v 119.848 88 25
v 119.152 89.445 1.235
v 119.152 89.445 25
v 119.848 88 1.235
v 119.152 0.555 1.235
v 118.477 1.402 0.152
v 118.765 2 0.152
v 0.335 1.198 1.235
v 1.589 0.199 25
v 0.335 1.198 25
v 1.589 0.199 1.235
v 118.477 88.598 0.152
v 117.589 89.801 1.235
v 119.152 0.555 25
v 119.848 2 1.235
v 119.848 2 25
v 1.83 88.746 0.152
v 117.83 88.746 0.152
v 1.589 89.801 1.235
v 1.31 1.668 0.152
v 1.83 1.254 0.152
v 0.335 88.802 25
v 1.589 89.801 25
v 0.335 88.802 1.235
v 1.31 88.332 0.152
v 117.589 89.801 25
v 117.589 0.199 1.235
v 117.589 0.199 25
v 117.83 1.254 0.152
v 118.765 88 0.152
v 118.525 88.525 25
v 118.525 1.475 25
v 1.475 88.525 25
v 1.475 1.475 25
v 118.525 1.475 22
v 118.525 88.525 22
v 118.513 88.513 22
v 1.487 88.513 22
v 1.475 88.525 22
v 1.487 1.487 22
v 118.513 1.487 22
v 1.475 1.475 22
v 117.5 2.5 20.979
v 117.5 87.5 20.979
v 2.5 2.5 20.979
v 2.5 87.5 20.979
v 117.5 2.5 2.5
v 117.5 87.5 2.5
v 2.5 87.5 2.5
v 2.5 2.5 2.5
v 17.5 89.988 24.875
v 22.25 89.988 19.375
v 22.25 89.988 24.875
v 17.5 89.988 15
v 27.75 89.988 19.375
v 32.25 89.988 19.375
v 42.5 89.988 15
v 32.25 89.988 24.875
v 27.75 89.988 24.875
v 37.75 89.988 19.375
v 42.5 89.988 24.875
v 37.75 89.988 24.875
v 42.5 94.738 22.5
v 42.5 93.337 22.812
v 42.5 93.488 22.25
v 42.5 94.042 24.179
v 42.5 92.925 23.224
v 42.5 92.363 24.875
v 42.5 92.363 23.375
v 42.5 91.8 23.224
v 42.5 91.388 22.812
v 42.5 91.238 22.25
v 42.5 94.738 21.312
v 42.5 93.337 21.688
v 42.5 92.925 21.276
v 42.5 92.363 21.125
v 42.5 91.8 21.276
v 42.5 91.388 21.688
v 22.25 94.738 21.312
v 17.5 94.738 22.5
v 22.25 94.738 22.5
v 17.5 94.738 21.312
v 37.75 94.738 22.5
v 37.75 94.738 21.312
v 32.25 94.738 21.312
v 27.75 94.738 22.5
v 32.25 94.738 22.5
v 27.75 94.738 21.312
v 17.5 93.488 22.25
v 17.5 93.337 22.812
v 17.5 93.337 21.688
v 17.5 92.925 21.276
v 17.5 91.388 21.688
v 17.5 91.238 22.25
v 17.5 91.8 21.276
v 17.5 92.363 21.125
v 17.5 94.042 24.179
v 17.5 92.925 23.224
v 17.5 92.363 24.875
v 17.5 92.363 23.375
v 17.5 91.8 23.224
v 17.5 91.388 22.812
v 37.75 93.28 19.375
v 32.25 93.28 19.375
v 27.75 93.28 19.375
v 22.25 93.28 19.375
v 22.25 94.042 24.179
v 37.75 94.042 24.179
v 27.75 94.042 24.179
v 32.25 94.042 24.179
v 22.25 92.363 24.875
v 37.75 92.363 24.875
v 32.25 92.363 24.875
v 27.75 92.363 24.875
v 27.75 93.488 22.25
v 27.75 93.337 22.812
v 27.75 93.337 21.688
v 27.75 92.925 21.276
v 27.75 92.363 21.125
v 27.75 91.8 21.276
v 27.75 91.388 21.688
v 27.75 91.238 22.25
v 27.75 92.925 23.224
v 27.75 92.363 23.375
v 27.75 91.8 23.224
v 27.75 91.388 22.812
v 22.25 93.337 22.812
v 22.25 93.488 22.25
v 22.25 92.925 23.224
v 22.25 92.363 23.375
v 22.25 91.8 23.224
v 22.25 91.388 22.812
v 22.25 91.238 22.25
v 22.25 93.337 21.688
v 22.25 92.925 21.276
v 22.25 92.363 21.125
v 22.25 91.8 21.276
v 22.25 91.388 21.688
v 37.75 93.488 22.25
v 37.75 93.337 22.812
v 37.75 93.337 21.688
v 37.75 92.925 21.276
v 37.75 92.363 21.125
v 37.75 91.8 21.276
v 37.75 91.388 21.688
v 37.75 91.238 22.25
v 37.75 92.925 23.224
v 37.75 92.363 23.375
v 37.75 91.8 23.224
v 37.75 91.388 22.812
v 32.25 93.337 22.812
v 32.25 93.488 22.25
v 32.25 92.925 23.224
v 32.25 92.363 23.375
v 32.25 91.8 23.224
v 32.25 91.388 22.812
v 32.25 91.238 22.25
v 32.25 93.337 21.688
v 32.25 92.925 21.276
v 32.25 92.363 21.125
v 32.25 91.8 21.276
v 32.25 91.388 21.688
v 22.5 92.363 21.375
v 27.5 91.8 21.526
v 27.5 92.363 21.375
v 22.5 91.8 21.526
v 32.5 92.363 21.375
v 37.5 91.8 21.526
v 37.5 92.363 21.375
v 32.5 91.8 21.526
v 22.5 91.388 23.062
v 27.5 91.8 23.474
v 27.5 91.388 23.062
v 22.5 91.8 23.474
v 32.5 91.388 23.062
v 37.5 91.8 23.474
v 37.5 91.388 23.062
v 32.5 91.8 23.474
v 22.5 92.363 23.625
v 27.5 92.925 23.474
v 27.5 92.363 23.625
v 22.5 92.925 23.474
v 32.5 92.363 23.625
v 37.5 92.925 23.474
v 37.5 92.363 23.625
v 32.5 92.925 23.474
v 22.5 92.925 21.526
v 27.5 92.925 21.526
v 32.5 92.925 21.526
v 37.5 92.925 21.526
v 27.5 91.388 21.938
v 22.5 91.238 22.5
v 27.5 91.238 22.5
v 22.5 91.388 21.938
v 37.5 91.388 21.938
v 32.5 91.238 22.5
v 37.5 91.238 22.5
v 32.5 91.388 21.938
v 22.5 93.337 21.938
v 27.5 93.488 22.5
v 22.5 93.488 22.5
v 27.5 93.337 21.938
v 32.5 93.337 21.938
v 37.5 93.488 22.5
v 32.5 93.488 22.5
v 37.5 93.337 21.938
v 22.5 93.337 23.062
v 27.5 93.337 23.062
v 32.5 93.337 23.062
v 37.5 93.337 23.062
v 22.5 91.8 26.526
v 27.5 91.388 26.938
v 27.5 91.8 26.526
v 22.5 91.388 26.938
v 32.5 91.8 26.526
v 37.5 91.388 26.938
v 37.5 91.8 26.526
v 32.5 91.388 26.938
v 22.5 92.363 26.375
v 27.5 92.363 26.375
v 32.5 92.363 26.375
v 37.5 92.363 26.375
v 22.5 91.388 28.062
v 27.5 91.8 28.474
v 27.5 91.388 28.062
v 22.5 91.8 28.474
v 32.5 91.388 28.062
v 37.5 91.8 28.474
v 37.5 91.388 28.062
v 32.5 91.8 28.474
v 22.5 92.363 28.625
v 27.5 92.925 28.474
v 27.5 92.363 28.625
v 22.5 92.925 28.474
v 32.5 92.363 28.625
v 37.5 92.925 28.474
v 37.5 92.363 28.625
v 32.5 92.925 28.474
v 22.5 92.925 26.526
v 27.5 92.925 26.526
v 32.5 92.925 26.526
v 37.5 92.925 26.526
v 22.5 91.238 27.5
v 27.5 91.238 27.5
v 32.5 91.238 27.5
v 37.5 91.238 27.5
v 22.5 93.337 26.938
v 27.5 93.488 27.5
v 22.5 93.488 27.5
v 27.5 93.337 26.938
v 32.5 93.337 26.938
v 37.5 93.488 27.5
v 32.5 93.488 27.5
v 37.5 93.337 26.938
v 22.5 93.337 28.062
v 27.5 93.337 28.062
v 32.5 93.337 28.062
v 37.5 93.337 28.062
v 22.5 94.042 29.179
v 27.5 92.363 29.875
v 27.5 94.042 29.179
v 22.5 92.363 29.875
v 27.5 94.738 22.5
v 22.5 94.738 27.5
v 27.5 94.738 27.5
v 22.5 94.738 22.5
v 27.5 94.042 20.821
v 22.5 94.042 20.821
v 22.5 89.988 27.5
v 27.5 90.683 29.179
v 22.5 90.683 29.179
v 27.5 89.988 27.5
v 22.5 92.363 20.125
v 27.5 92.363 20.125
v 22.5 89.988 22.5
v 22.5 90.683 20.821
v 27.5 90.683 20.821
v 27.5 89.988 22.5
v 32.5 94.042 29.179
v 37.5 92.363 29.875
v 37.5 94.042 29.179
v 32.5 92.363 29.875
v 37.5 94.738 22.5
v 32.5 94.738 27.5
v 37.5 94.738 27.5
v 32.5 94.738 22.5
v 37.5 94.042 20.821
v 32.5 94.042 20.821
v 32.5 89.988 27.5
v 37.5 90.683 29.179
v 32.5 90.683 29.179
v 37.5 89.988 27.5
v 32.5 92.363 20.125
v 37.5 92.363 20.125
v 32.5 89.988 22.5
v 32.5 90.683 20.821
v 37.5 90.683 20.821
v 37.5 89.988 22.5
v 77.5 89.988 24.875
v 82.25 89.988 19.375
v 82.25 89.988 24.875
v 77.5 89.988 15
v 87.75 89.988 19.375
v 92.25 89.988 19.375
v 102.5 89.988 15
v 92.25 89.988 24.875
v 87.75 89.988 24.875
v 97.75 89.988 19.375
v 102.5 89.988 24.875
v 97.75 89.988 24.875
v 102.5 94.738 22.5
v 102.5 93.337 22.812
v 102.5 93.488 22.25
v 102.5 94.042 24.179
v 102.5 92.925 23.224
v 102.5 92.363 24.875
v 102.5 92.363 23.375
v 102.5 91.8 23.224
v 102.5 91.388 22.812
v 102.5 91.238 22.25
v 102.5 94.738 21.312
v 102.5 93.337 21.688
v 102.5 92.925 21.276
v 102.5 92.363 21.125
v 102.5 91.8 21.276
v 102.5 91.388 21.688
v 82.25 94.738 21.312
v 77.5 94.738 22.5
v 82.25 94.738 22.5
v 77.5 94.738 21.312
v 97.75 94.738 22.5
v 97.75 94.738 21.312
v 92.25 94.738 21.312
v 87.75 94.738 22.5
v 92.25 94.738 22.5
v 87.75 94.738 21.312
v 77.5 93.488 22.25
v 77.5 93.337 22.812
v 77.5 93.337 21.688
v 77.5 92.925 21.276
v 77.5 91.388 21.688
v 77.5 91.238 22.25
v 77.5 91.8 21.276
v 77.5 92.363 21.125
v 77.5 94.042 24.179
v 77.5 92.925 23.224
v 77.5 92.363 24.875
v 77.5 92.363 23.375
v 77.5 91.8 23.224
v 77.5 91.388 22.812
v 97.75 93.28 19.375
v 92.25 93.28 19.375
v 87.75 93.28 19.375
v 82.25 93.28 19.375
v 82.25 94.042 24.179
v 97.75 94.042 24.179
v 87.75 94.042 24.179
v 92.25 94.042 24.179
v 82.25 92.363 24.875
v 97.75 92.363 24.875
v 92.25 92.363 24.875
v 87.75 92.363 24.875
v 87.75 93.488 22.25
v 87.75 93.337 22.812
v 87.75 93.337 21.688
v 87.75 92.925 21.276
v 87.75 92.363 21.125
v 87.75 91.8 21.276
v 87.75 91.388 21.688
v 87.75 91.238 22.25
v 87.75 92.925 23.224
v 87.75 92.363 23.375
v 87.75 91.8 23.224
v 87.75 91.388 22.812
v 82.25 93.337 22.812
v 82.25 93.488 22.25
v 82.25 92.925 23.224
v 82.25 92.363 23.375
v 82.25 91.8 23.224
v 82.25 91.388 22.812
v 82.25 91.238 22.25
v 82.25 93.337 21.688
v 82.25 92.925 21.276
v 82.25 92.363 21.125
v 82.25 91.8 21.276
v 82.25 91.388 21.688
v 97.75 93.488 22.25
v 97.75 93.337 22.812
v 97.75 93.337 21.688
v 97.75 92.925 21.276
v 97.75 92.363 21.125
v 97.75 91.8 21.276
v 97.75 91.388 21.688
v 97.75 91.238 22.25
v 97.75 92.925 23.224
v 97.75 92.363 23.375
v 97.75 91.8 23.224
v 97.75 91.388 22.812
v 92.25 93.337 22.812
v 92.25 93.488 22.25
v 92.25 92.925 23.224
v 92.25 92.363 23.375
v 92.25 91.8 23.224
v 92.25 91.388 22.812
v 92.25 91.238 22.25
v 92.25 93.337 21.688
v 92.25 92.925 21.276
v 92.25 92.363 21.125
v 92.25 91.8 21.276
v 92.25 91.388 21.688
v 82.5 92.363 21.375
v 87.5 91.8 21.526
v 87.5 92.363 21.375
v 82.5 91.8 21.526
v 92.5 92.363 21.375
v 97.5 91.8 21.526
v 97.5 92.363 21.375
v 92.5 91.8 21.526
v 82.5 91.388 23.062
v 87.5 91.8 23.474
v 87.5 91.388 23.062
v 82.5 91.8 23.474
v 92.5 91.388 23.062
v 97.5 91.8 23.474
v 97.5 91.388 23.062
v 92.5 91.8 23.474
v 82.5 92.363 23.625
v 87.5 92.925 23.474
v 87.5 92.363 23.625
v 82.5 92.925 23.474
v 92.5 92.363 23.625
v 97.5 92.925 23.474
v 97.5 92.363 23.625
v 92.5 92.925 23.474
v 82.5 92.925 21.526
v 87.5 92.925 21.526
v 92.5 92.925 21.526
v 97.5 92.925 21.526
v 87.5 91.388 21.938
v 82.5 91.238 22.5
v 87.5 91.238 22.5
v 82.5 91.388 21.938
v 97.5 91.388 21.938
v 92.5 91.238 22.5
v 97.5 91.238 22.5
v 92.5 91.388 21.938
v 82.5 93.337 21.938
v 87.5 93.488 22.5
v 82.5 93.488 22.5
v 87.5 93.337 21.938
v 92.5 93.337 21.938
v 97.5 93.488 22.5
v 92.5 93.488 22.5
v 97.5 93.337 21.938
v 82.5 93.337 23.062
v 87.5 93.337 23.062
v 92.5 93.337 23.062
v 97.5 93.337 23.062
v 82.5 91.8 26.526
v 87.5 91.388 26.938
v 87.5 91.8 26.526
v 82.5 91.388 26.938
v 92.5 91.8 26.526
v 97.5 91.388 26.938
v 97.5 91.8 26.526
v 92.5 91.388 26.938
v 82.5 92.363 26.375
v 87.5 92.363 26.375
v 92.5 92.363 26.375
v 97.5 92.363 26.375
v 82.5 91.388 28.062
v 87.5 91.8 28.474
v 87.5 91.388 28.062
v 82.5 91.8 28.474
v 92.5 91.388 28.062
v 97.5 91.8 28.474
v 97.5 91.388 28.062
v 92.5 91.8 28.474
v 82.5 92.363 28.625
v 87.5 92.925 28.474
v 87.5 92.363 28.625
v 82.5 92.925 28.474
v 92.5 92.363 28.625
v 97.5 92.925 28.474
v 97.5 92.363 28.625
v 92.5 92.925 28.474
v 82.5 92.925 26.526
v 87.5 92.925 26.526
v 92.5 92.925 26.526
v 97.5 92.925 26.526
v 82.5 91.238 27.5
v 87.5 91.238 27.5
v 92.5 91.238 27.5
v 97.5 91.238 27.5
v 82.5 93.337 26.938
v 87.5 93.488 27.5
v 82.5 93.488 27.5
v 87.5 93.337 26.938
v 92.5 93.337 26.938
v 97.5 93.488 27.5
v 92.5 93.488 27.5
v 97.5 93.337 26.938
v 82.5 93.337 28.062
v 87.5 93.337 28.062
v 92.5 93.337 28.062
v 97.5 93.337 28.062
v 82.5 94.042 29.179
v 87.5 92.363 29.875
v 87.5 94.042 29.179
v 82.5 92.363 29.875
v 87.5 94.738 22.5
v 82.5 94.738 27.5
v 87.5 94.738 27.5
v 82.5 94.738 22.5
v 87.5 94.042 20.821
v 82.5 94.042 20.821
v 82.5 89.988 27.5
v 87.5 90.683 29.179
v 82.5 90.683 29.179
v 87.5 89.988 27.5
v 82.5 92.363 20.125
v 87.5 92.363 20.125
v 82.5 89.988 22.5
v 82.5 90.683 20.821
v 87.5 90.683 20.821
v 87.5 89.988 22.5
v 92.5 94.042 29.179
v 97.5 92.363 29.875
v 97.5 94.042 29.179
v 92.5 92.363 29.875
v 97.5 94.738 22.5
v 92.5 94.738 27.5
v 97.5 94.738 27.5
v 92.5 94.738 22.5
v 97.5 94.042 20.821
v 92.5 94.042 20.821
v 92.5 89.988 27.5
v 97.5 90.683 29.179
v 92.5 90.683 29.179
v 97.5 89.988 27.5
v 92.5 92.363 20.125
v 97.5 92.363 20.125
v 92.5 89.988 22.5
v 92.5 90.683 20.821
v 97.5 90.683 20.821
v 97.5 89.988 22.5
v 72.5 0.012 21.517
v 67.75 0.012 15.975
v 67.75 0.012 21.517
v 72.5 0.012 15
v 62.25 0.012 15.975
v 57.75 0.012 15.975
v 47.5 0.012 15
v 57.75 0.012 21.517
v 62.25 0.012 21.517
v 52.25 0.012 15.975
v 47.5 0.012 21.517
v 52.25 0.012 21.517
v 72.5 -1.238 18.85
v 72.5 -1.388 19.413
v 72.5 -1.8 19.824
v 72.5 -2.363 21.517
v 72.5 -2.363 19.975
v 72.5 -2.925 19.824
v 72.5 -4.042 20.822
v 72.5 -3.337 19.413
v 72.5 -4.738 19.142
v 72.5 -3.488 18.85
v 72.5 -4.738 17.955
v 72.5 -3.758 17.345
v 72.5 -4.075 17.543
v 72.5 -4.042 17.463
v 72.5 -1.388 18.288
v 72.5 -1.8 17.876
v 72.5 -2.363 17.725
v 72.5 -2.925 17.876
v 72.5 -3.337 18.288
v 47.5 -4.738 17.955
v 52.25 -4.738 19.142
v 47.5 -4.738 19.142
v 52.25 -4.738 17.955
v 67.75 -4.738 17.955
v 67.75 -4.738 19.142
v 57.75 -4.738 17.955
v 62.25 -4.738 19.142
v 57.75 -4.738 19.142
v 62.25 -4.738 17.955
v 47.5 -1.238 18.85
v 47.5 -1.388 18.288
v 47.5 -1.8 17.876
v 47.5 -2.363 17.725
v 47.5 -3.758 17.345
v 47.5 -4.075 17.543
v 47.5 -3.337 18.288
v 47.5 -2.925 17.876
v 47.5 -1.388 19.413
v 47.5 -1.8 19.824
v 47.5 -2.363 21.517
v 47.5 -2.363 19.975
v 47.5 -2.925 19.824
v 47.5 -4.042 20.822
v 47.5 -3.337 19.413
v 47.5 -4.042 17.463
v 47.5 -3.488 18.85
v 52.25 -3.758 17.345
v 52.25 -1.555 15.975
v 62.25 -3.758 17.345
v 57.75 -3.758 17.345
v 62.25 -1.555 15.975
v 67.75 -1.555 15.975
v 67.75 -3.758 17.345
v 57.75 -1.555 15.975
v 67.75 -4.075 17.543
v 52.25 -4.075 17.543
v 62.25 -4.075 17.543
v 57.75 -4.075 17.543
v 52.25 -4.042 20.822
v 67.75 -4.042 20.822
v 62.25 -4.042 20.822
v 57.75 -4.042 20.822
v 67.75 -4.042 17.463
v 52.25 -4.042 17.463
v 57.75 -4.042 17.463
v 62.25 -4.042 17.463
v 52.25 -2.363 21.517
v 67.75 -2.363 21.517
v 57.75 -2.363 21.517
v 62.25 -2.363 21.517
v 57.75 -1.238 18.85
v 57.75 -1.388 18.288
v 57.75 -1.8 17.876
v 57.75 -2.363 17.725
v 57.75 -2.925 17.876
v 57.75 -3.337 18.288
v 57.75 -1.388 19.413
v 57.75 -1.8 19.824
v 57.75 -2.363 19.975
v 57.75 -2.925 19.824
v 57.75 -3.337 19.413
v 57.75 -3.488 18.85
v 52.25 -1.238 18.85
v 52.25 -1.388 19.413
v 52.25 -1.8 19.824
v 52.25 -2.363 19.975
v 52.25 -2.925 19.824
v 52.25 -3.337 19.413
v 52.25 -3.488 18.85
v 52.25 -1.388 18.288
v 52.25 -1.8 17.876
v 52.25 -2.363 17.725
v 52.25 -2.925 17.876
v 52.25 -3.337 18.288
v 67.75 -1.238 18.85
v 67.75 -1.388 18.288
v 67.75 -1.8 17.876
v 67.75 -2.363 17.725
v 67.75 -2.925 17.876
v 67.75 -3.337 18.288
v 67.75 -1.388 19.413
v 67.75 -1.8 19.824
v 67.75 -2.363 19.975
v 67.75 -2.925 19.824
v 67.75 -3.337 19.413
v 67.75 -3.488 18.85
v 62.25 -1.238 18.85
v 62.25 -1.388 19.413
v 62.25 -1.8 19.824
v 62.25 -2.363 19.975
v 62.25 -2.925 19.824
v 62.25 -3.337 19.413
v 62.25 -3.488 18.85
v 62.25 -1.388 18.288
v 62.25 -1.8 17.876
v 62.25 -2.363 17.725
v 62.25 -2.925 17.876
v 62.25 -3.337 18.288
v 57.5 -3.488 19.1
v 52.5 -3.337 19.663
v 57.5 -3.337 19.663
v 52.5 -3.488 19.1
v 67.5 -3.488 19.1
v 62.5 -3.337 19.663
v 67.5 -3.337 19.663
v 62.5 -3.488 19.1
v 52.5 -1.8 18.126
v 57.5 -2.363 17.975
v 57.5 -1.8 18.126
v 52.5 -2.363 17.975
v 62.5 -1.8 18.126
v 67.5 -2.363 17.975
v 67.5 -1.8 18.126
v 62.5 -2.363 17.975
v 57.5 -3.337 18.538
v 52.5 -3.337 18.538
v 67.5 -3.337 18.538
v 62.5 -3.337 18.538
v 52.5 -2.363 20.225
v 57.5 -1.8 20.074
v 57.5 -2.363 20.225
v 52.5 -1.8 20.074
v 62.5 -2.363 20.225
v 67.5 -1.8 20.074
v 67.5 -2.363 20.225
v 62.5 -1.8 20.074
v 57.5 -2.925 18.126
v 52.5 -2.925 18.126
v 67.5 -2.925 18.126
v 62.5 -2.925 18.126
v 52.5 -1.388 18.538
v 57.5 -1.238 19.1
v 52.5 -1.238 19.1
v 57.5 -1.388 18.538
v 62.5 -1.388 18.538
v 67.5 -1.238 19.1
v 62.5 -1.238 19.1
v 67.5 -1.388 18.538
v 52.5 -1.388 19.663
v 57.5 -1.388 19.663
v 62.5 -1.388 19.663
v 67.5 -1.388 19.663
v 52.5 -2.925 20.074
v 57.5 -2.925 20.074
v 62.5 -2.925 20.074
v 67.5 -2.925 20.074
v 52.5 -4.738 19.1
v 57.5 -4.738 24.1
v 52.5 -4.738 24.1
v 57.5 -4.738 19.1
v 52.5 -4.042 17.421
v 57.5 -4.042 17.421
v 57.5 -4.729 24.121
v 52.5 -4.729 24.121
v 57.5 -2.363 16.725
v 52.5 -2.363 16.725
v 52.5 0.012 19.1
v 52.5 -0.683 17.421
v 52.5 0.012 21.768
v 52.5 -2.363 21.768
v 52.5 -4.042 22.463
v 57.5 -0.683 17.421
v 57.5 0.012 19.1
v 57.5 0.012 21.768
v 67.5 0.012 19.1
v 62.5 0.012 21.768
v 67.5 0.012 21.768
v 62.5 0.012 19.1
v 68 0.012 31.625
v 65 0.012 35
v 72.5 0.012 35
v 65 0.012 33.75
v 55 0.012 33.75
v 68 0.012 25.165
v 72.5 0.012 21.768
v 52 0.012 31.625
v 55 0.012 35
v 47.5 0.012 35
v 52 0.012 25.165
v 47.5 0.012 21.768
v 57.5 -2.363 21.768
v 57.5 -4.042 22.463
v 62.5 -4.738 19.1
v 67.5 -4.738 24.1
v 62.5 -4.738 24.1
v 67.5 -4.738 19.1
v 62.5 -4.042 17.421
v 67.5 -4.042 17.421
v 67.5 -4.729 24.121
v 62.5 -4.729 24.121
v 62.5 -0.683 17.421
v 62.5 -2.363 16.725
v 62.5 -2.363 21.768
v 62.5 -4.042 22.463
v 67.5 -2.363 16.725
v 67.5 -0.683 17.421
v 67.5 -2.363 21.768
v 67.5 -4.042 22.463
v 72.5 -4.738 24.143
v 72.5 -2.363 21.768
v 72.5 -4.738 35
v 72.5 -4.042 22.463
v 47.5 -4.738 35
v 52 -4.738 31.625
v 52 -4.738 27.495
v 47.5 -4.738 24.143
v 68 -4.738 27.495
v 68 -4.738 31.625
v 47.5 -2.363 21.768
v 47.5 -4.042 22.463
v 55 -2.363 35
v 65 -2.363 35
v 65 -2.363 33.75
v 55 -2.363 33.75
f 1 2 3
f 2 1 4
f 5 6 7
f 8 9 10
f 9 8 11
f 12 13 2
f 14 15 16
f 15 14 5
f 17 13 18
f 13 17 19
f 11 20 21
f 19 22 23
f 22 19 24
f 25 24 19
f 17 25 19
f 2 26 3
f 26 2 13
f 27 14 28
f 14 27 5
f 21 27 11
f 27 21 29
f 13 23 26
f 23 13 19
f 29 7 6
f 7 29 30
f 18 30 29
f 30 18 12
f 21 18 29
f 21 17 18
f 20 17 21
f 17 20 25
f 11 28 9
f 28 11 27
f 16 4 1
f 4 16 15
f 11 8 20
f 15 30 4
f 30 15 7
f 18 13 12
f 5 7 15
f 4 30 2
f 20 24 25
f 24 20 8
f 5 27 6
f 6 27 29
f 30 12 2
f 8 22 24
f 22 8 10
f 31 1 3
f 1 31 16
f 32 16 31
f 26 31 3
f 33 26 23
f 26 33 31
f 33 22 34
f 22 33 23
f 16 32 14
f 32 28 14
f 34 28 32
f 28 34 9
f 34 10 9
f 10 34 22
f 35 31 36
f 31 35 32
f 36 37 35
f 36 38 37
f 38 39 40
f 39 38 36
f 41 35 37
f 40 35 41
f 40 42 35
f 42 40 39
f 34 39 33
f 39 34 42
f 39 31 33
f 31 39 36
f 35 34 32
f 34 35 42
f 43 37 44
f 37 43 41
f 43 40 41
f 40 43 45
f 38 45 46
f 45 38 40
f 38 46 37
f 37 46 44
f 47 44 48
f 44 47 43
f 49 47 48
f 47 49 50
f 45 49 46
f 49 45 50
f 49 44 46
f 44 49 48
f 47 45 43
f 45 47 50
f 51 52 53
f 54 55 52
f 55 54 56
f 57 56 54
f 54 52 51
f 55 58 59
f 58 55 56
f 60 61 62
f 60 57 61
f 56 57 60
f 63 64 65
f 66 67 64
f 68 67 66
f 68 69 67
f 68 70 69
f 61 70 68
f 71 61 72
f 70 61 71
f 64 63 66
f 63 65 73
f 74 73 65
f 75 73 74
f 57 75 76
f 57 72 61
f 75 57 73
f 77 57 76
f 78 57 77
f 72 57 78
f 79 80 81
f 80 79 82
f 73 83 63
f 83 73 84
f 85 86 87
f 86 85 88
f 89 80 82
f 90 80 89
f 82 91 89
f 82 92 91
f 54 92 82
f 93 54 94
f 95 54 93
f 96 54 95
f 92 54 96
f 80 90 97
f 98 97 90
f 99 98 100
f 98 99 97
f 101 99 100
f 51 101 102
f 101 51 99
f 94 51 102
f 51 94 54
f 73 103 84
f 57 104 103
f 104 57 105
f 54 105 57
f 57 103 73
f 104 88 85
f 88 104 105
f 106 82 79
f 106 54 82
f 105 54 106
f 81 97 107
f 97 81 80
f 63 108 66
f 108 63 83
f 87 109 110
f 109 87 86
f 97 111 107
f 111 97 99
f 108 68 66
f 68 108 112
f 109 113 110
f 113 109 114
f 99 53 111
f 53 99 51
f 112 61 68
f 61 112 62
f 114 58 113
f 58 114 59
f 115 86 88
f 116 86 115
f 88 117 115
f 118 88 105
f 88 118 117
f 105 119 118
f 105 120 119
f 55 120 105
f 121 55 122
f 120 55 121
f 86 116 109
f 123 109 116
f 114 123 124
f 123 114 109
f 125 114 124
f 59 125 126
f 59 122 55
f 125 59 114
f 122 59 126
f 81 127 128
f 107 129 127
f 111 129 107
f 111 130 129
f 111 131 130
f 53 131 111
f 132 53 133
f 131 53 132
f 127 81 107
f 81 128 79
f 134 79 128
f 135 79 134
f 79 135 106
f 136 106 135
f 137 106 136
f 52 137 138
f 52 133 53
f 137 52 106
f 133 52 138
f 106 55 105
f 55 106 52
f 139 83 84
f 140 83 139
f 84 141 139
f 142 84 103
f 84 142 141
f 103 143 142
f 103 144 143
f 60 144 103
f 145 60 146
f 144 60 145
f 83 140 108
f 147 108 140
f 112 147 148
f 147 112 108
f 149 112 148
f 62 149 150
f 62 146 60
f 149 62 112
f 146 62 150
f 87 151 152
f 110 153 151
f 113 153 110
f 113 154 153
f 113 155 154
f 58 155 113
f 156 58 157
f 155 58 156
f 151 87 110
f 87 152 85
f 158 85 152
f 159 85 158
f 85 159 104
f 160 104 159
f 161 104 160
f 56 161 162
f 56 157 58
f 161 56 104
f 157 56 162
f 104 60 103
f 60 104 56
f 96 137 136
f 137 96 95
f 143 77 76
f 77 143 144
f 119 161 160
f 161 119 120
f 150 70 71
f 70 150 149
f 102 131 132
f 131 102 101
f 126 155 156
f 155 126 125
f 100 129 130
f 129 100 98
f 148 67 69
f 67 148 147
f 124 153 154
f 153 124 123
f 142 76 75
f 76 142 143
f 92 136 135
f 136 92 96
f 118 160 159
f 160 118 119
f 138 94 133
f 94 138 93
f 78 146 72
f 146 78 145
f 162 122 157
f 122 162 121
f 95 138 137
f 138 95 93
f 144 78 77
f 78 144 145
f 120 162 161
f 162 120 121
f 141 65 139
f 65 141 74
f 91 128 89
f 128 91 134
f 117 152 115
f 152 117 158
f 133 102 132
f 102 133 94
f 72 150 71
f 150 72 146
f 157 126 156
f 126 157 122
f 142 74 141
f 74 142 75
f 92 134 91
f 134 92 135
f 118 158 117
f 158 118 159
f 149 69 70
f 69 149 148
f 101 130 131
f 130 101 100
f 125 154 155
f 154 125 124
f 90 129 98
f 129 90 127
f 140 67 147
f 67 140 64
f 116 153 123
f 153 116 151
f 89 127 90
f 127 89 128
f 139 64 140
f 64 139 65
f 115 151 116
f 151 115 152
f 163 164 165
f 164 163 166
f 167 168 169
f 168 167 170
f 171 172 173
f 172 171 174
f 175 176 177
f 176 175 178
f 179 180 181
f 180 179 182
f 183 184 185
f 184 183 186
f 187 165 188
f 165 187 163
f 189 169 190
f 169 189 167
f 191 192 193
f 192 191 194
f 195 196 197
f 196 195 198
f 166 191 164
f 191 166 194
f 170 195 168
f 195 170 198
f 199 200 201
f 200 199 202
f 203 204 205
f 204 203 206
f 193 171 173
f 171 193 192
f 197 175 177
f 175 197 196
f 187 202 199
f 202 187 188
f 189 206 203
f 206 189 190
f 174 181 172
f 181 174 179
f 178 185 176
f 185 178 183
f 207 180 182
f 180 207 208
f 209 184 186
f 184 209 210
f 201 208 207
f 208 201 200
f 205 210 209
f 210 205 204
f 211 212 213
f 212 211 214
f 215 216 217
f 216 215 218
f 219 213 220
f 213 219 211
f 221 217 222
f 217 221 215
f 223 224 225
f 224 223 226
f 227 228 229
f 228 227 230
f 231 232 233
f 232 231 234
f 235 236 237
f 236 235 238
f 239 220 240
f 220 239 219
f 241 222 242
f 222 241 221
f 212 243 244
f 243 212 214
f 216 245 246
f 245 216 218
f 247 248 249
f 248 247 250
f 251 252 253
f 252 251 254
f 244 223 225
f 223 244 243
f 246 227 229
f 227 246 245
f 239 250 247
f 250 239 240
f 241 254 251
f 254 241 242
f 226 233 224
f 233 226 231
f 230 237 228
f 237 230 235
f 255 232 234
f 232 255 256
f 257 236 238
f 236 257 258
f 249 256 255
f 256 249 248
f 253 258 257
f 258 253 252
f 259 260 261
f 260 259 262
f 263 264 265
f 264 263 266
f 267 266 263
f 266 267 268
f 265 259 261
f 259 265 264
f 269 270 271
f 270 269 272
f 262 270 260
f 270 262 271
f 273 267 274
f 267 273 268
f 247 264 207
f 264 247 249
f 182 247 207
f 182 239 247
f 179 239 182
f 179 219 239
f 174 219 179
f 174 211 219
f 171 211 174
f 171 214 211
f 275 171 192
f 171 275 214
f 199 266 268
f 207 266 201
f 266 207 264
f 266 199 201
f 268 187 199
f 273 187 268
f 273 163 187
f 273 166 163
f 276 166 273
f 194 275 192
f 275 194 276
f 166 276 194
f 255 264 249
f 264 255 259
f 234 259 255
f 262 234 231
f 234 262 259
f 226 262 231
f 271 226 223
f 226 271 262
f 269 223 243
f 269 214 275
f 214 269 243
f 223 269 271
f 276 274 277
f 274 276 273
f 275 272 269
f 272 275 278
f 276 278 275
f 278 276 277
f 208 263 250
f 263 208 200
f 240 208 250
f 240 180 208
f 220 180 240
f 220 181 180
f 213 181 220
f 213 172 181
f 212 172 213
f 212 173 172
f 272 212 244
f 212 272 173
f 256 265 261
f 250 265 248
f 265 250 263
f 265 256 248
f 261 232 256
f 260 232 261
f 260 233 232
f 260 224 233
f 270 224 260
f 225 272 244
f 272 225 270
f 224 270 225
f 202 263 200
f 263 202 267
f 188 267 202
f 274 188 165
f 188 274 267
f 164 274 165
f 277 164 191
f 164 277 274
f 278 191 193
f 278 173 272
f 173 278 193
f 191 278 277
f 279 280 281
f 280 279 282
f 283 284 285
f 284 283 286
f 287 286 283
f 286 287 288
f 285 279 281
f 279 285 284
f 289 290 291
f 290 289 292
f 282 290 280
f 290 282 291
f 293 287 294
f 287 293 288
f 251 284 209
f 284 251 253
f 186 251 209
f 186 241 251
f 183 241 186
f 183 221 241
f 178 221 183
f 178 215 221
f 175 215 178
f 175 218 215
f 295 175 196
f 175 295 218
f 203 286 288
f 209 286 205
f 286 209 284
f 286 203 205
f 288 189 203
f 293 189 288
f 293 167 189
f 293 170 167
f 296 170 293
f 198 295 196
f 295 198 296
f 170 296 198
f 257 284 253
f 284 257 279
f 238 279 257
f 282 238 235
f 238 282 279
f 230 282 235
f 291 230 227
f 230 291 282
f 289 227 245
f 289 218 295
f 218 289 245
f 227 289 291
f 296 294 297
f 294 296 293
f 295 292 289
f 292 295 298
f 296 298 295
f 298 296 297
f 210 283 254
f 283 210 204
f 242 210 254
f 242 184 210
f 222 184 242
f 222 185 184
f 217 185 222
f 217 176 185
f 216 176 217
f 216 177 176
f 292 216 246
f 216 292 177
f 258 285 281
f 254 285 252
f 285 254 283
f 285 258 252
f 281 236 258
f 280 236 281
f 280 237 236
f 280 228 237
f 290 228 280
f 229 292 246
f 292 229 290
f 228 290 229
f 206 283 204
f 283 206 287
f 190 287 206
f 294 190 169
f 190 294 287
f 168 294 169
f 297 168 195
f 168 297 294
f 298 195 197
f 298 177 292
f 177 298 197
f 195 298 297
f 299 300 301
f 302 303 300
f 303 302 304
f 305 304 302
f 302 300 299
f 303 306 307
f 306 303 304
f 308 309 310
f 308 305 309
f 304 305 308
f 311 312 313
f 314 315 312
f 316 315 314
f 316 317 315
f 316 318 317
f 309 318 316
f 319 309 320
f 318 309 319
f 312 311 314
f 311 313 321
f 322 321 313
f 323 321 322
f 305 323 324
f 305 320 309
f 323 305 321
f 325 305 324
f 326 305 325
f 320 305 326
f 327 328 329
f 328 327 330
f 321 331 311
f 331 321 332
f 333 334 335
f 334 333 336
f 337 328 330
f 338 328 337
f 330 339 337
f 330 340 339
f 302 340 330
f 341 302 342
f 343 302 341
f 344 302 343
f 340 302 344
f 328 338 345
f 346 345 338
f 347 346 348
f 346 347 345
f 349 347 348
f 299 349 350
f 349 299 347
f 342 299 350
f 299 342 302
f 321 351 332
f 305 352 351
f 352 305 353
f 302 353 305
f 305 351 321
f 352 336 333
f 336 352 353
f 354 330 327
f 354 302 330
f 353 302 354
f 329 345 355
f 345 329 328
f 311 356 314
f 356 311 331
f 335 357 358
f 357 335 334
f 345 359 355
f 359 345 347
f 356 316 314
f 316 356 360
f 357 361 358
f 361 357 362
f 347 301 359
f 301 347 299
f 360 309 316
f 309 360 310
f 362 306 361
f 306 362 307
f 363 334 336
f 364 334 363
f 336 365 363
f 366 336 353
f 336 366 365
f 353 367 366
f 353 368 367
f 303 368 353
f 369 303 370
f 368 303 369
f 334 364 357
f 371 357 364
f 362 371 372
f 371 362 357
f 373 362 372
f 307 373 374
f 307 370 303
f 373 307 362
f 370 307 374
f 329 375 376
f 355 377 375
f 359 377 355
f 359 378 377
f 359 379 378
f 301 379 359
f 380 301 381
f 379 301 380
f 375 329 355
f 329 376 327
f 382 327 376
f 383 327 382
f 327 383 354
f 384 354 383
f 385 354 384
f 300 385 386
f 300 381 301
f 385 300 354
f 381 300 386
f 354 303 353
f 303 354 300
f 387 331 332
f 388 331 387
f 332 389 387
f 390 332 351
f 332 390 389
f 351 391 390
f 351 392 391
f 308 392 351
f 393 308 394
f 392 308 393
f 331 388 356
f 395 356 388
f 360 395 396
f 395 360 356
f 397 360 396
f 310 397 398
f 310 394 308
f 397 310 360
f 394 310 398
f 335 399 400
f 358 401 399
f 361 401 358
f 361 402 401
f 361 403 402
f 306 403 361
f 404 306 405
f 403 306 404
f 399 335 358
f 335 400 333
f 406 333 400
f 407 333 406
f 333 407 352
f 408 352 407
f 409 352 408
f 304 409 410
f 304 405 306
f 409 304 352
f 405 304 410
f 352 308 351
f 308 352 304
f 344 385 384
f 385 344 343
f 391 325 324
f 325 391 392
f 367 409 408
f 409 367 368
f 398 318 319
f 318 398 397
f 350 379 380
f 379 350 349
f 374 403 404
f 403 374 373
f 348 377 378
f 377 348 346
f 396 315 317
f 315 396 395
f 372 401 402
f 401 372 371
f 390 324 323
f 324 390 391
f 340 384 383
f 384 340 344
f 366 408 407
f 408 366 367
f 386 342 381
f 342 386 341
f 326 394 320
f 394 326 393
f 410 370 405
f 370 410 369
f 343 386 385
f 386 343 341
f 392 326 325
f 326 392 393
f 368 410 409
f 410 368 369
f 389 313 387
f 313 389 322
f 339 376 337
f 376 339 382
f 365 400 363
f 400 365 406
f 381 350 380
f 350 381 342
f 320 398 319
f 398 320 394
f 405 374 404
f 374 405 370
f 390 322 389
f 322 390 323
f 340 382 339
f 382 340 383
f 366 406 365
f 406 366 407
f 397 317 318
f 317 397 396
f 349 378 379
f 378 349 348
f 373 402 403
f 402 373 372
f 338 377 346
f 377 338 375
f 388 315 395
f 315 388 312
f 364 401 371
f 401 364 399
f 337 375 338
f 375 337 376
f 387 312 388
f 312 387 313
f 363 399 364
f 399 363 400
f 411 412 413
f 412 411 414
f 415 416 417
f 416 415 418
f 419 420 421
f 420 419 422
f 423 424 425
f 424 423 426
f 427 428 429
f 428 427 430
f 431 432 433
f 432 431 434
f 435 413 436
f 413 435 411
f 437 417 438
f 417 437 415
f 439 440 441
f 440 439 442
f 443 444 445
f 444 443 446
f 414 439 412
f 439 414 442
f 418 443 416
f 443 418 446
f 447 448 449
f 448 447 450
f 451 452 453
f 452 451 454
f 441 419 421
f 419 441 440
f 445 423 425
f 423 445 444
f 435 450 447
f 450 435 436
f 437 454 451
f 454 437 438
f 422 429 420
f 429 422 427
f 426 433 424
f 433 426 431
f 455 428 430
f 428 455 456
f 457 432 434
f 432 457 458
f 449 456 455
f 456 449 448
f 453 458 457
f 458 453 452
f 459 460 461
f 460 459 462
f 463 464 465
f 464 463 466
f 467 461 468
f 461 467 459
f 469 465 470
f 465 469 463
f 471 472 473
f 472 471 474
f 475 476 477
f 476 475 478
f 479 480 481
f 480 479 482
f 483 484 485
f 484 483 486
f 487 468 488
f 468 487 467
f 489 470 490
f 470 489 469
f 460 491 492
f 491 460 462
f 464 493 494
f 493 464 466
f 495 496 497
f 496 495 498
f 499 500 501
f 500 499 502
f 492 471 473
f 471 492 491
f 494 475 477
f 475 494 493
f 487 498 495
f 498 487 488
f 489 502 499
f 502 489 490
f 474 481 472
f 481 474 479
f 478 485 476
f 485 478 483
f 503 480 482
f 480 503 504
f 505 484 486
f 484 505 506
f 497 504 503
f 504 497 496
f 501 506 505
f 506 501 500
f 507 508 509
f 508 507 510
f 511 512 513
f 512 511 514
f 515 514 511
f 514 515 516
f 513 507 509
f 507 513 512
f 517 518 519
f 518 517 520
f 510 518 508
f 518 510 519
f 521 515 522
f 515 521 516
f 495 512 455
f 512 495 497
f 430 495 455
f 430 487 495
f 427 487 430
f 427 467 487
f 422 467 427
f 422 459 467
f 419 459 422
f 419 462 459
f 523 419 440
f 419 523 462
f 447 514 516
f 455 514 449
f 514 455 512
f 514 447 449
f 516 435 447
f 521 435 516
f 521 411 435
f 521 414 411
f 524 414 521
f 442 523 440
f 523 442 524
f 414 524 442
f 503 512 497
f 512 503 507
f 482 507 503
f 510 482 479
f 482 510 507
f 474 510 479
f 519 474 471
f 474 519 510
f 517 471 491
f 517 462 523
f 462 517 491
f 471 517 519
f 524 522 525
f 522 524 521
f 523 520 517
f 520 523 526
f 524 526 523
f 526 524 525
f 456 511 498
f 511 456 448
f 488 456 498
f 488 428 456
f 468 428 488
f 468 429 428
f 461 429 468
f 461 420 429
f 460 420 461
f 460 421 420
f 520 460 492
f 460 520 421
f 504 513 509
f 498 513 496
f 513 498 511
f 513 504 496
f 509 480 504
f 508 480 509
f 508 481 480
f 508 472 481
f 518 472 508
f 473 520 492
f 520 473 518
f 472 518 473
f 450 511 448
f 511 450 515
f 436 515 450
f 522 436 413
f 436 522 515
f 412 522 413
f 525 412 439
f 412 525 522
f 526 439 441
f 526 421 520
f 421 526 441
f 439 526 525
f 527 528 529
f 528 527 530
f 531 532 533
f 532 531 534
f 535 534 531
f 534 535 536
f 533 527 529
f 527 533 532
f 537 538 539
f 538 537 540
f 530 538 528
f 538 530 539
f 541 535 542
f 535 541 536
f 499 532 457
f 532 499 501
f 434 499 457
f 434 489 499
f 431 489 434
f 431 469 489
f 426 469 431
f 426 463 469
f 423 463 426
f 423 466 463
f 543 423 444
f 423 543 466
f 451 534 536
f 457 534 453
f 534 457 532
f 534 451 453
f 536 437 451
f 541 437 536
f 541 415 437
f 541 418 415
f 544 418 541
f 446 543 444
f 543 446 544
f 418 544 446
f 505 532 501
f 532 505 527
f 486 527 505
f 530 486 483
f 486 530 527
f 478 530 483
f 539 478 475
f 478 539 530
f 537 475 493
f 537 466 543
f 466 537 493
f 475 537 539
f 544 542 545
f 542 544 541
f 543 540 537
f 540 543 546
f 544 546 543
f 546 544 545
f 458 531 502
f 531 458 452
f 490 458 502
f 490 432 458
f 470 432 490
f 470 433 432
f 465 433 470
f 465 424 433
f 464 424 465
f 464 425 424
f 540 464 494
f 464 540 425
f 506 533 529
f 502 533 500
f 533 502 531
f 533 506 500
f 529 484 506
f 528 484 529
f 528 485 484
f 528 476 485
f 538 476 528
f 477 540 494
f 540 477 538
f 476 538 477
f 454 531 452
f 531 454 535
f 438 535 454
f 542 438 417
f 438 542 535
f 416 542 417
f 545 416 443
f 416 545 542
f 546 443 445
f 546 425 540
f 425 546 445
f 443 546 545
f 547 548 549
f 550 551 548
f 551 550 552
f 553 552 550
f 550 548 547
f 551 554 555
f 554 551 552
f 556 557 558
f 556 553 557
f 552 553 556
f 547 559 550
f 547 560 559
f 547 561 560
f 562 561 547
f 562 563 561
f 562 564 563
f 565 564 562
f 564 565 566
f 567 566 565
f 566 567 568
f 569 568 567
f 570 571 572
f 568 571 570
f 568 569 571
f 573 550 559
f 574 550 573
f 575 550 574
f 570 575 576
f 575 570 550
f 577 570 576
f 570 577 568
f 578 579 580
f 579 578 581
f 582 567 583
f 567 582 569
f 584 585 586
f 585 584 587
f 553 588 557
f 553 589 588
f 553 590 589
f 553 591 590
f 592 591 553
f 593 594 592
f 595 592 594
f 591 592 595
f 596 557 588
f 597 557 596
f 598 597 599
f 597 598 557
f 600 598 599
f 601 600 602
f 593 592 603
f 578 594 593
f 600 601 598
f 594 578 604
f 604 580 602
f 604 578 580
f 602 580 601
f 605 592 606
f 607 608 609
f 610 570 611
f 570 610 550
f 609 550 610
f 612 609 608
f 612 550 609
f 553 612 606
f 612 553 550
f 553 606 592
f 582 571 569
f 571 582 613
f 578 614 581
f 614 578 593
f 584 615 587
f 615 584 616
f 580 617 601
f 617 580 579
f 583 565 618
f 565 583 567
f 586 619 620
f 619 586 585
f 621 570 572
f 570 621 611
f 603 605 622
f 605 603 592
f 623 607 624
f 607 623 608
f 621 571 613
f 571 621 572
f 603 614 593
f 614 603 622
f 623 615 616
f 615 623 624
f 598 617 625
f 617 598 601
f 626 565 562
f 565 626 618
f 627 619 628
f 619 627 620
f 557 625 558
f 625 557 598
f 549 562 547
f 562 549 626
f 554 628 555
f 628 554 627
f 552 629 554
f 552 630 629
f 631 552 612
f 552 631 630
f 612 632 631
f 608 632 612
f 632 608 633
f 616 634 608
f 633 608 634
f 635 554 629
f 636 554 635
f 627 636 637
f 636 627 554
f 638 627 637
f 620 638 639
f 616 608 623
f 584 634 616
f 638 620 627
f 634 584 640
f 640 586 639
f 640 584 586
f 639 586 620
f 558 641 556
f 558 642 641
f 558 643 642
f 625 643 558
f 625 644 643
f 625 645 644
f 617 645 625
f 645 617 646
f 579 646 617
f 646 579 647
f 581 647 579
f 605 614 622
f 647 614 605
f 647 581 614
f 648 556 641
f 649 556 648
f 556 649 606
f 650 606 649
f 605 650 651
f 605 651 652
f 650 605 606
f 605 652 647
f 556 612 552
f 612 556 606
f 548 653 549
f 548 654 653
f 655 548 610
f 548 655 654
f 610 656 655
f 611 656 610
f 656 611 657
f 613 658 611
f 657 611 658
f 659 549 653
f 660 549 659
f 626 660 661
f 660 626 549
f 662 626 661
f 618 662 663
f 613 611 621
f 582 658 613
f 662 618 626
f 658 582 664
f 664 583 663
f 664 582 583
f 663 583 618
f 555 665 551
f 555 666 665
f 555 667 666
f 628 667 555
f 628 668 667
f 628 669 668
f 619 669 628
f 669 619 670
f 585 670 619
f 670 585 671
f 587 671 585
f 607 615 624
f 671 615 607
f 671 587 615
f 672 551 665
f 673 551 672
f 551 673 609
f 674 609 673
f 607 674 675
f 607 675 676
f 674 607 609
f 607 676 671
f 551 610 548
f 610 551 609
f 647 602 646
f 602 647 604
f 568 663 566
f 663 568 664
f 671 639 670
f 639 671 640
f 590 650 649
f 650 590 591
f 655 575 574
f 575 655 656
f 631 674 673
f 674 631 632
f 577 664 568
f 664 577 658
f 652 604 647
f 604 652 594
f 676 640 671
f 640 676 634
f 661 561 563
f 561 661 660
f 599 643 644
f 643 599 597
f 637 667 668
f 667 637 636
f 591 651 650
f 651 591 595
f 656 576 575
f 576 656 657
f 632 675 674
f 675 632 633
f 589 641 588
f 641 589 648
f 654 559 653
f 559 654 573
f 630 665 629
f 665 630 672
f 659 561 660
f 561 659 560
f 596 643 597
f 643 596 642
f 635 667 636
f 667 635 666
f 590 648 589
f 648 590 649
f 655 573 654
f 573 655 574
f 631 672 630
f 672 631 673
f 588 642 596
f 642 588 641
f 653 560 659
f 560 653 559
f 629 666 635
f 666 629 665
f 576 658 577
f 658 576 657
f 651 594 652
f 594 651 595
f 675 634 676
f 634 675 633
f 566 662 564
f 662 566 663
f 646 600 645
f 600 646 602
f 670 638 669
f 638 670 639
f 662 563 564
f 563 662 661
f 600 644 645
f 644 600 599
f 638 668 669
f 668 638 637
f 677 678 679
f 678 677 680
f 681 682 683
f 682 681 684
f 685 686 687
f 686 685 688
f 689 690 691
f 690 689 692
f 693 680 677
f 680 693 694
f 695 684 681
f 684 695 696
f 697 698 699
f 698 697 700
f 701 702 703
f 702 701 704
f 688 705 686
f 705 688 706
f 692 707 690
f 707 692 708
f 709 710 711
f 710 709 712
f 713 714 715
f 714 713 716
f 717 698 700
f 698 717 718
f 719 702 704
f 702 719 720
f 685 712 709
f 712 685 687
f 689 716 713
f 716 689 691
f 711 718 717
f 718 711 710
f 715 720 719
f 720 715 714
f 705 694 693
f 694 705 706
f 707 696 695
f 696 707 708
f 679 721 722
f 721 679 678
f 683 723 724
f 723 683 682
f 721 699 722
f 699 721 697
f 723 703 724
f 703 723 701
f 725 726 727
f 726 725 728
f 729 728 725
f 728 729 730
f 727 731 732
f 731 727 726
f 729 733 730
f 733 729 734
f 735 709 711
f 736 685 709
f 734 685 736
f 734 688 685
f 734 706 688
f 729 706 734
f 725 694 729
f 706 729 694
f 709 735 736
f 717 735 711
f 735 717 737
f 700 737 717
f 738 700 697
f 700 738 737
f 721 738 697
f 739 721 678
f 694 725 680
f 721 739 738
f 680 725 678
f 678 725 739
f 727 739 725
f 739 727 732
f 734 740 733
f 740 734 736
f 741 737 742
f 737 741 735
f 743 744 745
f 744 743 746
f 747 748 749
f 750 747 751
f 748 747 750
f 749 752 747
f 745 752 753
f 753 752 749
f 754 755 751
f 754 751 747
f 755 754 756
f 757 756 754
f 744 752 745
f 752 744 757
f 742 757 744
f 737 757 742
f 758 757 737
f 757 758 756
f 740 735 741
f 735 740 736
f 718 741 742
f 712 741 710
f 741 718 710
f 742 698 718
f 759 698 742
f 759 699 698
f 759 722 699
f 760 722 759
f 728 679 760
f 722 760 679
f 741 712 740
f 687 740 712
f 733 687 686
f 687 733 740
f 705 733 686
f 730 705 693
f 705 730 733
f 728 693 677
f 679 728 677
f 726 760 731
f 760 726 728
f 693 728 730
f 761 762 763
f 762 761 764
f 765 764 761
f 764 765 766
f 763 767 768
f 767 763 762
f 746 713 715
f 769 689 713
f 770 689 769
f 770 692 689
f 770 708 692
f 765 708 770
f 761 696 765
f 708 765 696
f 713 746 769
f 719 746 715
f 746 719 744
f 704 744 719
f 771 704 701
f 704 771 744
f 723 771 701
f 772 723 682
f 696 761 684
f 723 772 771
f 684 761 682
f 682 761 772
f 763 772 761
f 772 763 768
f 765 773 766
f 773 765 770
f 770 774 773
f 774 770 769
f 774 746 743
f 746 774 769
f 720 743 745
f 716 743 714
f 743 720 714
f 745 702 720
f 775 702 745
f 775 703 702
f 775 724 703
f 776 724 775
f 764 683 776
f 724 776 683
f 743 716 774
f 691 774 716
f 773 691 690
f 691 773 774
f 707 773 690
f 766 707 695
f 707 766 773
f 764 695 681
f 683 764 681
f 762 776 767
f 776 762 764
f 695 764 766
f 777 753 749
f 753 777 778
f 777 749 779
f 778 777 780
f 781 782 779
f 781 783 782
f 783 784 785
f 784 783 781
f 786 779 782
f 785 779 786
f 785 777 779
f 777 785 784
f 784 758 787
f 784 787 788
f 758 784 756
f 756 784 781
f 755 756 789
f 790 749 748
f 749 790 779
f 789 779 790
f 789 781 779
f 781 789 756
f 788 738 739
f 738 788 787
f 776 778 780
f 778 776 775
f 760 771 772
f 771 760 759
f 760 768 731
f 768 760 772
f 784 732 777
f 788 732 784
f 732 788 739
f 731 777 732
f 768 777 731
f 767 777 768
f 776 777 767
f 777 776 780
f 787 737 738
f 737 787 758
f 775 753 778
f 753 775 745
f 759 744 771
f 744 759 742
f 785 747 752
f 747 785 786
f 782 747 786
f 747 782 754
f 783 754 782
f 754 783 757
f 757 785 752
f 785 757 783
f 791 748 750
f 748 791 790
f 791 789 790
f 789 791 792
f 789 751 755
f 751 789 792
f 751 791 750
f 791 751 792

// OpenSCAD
// file: basic_shapes.scad
module hole_array(xs, diameter, height, y = 0, z = 0) {
    for (x = xs) {
        translate([x, y, z]) {
            cylinder(
                d = diameter,
                h = height
            );
        }
    }
}

module flat_top_rectangular_pyramid(
    top_width = 0,
    top_length = 0,

    bottom_width = 0,
    bottom_length = 0,

    height = 0,

    top_x = undef,
    top_y = undef,

    top_weight_x = .5,
    top_weight_y = .5
) {
    top_x = top_x != undef
        ? top_x
        : (bottom_width - top_width) * top_weight_x;
    top_y = top_y != undef
        ? top_y
        : (bottom_length - top_length) * top_weight_y;

    max_difference = max(bottom_width - top_width, bottom_length - top_length);
    height = height == undef
        ? max_difference / 2
        : height;

    polyhedron(
        [
            [0, 0, 0],
            [bottom_width, 0, 0],
            [bottom_width, bottom_length, 0],
            [0, bottom_length, 0],
            [top_x, top_y, height],
            [top_width + top_x, top_y, height],
            [top_width + top_x, top_length + top_y, height],
            [top_x, top_length + top_y, height]
        ], [
            [0, 1, 2, 3],
            [4, 5, 1, 0],
            [7, 6, 5, 4],
            [5, 6, 2, 1],
            [6, 7, 3, 2],
            [7, 4, 0, 3]
        ]
    );
}

module rounded_cube(dimensions, radius, $fn = $fn) {
    positions = [
        [radius, radius, radius],
        [dimensions.x - radius, radius, radius],
        [dimensions.x - radius, dimensions.y - radius, radius],
        [radius, dimensions.y - radius, radius],
        [radius, radius, dimensions.z - radius],
        [dimensions.x - radius, radius, dimensions.z - radius],
        [dimensions.x - radius, dimensions.y - radius, dimensions.z - radius],
        [radius, dimensions.y - radius, dimensions.z - radius],
    ];

    if (radius > 0) {
        hull() {
            for (position = positions) {
                translate(position) sphere(r = radius);
            }
        }
    } else {
        cube(dimensions);
    }
}

module support_wall(
    dimensions,
    is_back = true,
    railing_diameter = 3.5,
    support_width = 2,
    support_length = 4,
    gutter = 4
) {
    railing_z = railing_diameter / 4;

    module _support(height = dimensions[2], depth = support_length) {
        translate([0, -depth, 0]) {
            flat_top_rectangular_pyramid(
                top_width = support_width,
                top_length = 0,
                bottom_width = support_width,
                bottom_length = support_length,
                height = height,
                top_weight_y = 1
            );
        }
    }

    translate(is_back ? [0, dimensions[1], 0] : [0, 0, 0]) {
        mirror(is_back ? [0, 1, 0] : [0, 0, 0]) {
            cube(dimensions);

            translate([0, dimensions[1] / 2, dimensions[2] + railing_z]) {
                rotate([0, 90, 0]) {
                    cylinder(
                        d = railing_diameter,
                        h = dimensions[0],
                        $fn = 9
                    );
                }
            }

            translate([gutter, 0, 0]) {
                _support();
            }
            translate([dimensions[0] - support_length - gutter, 0, 0]) {
                _support();
            }
        }
    }
}

module ring(diameter, height, thickness) {
    e = 0.034;

    difference() {
        cylinder(d = diameter, h = height);
        translate([0, 0, -e]) {
            cylinder(d = diameter - thickness * 2, h = height + e * 2);
        }
    }
}

module cylinder_grip(
    diameter,
    height,
    count,
    rotation_offset = 0,
    size = 1,
    $fn = undef
) {
    if (size > 0) {
        count = count != undef
            ? count
            : floor((diameter * PI) / size / 2);

        for (i = [0 : count - 1]) {
            rotate([0, 0, rotation_offset + 360 * i / count]) {
                translate([0, diameter / 2, 0]) {
                    cylinder(d = size, h = height);
                }
            }
        }
    }
}
// file: values.scad
DEFAULT_ROUNDING = 24;
HIDEF_ROUNDING = 120;

SACRIFICIAL_BRIDGE_HEIGHT = .2;
BREAKAWAY_SUPPORT_DEPTH = .2;

PCB_WIDTH = 181.356;
PCB_LENGTH = 127.254;
PCB_HEIGHT = 1.6;
PCB_MOUNT_HOLE_DIAMETER = 3.2;

PCB_BATTERY_CAVITY_X = 147.828;
PCB_BATTERY_CAVITY_Y = PCB_LENGTH - 94.234;
PCB_BATTERY_CAVITY_LENGTH = 66.8;

PCB_COMPONENTS_X = 2.126;
PCB_COMPONENTS_Y = 38.1;
PCB_COMPONENTS_WIDTH = PCB_WIDTH - PCB_COMPONENTS_X * 2;
PCB_COMPONENTS_LENGTH = PCB_LENGTH - PCB_COMPONENTS_Y - 1.78;
PCB_COMPONENTS_HEIGHT = 12;

PCB_SWITCH_X = 166.116;
PCB_SWITCH_Y = PCB_LENGTH - 21.59;

BUTTON_DIAMETER = 6;
BUTTON_LENGTH = 6.6;
BUTTON_WIDTH = 4.5;
BUTTON_HEIGHT = 6;

POT_HEIGHT = 7.8;

PCB_HOLES = [
    [6.64, PCB_LENGTH - 122.682],
    [62.52, PCB_LENGTH - 122.682],
    [118.4, PCB_LENGTH - 122.682],
    [174.28, PCB_LENGTH - 122.682],

    [6.64, PCB_LENGTH - 97.79],
    [62.52, PCB_LENGTH - 97.79],
    [118.4, PCB_LENGTH - 97.79],
    [174.28, PCB_LENGTH - 97.79],

    [3.302, PCB_LENGTH - 22.098],
    [178.054, PCB_LENGTH - 3.302],
];

PCB_BUTTONS = [
    [8.89, PCB_LENGTH - BUTTON_LENGTH - 111.506],
    [16.51, PCB_LENGTH - BUTTON_LENGTH - 106.426],
    [24.13, PCB_LENGTH - BUTTON_LENGTH - 111.506],
    [31.75, PCB_LENGTH - BUTTON_LENGTH - 106.426],
    [39.37, PCB_LENGTH - BUTTON_LENGTH - 111.506],
    [46.99, PCB_LENGTH - BUTTON_LENGTH - 106.426],
    [54.61, PCB_LENGTH - BUTTON_LENGTH - 111.506],
    [69.85, PCB_LENGTH - BUTTON_LENGTH - 111.506],
    [77.47, PCB_LENGTH - BUTTON_LENGTH - 106.426],
    [85.09, PCB_LENGTH - BUTTON_LENGTH - 111.506],
    [92.71, PCB_LENGTH - BUTTON_LENGTH - 106.426],
    [100.33, PCB_LENGTH - BUTTON_LENGTH - 111.506],
    [115.57, PCB_LENGTH - BUTTON_LENGTH - 111.506],
    [123.19, PCB_LENGTH - BUTTON_LENGTH - 106.426],
    [130.81, PCB_LENGTH - BUTTON_LENGTH - 111.506],
    [138.43, PCB_LENGTH - BUTTON_LENGTH - 106.426],
    [146.05, PCB_LENGTH - BUTTON_LENGTH - 111.506],
    [153.67, PCB_LENGTH - BUTTON_LENGTH - 106.426],
    [161.29, PCB_LENGTH - BUTTON_LENGTH - 111.506],
    [176.53, PCB_LENGTH - BUTTON_LENGTH - 111.506],
];

PCB_VOLUME_WHEEL_X = 177.271969;
PCB_VOLUME_WHEEL_Y = PCB_LENGTH - 20.828;

SCREW_HEAD_DIAMETER = 6;
SCREW_HEAD_HEIGHT = 2.2;
NUT_DIAMETER = 6.4;
NUT_HEIGHT = 2.6;

MOUNT_STILT_MINIMUM_HEIGHT = NUT_HEIGHT + .5 + 2; // TODO: tidy against mount_stilt args

NATURAL_KEY_SEQUENCES = [
    [1,0,1,0,1,1,0,1,0,1,0,1,],
    [0,1,0,1,1,0,1,0,1,0,1,1,],
    [1,0,1,1,0,1,0,1,0,1,1,0,],
    [0,1,1,0,1,0,1,0,1,1,0,1,],
    [1,1,0,1,0,1,0,1,1,0,1,0,],
    [1,0,1,0,1,0,1,1,0,1,0,1,],
    [0,1,0,1,0,1,1,0,1,0,1,1,],
    [1,0,1,0,1,1,0,1,0,1,1,0,],
    [0,1,0,1,1,0,1,0,1,1,0,1,],
    [1,0,1,1,0,1,0,1,1,0,1,0,],
    [0,1,1,0,1,0,1,1,0,1,0,1,],
    [1,1,0,1,0,1,1,0,1,0,1,0,],
];

HINGE_CLASP_DEFAULT_PIN_DIAMETER = 1.75; // filament diameter
HINGE_CLASP_DEFAULT_MINIMAL_SUPPORT = 1.5;
HINGE_CLASP_MINIMUM_TOOTH_WIDTH = 5;
HINGE_CLASP_MINIMUM_TOOTH_COUNT = 5;
HINGE_CLASP_MINIMUM_WIDTH = HINGE_CLASP_MINIMUM_TOOTH_WIDTH
    * HINGE_CLASP_MINIMUM_TOOTH_COUNT;
MINIMUM_HINGE_CLASP_LENGTH = 20;

HINGE_CLASP_SIDE_FRONT_BACK = 0;
HINGE_CLASP_SIDE_LEFT_RIGHT = 1;

LIP_BOX_DEFAULT_LIP_HEIGHT = 3;

BATTERY_WIDTH = 27.5;
BATTERY_LENGTH = 51;
BATTERY_HEIGHT = 16.5;
BATTERY_SNAP_LENGTH = 5;

/* AZ40R https://www.jameco.com/Jameco/Products/ProdDS/2227516.pdf */
SPEAKER_DIAMETER = 40;
SPEAKER_HEIGHT = 5;
SPEAKER_CLEARANCE = 2;

/* https://www.ckswitches.com/media/1428/os.pdf */
SWITCH_BASE_WIDTH = 4.3;
SWITCH_BASE_LENGTH = 8.6;
SWITCH_BASE_HEIGHT = 4;
SWITCH_ACTUATOR_WIDTH = 2; // TODO: confirm IRL
SWITCH_ACTUATOR_LENGTH = 2;
SWITCH_ACTUATOR_HEIGHT = 5.6;
SWITCH_ACTUATOR_TRAVEL = 1.5;
SWITCH_ORIGIN = [SWITCH_BASE_WIDTH / 2, 2.1];

PENCIL_STAND_CAVITY_DIAMETER = 8.5;

WINDOW_PANE_HEIGHT = 25.4 * 1 / 8;
// main file
include <values.scad>;

use <basic_shapes.scad>;
use <hinge_clasp.scad>;

module enclosure_half(
    width, length, height,

    wall = 2.5,
    floor_ceiling = undef,

    add_lip = false,
    remove_lip = false,

    include_hinge = true,
    include_hinge_parts = false,

    hinge_count = undef,
    clasp_count = undef,

    include_clasp = true,

    hinge_clasp_side = HINGE_CLASP_SIDE_FRONT_BACK,

    just_hinge_parts = false,

    lip = 1,
    lip_height = LIP_BOX_DEFAULT_LIP_HEIGHT,

    radius = 0,

    chamfer_lip_removal = true,

    gutter = 5,
    clasp_end_gutter = undef,
    hinge_end_gutter = undef,

    tolerance = .1,

    $fn = $fn
) {
    e = 0.01234;

    is_left_right_hinge = hinge_clasp_side == HINGE_CLASP_SIDE_LEFT_RIGHT;

    _width = is_left_right_hinge ? length : width;
    _length = is_left_right_hinge ? width : length;

    floor_ceiling = floor_ceiling ? floor_ceiling : wall;
    assumed_total_height = height * 2;

    lip_offset_xy = wall - lip;
    lip_offset_z = 0;
    lip_difference = lip_offset_xy * 2;

    module _outer_wall() {
        group() {
            difference() {
                rounded_cube(
                    [_width, _length, height + radius],
                    radius,
                    $fn = $fn
                );
                translate([-e, -e, height]) {
                    cube([
                        _width + e * 2,
                        _length + e * 2,
                        radius + e
                    ]);
                }
            }

            if (add_lip) {
                translate([
                    lip_offset_xy + tolerance / 4,
                    lip_offset_xy + tolerance / 4,
                    floor_ceiling - e
                ]) {
                    cube([
                        _width - lip_difference - tolerance / 2,
                        _length - lip_difference - tolerance / 2,
                        height + lip_height - floor_ceiling + e
                    ]);
                }
            }
        }
    }

    module _inner_cutout() {
        translate([wall, wall, floor_ceiling]) {
            cube([
                _width - wall * 2,
                _length - wall * 2,
                height + lip_height + e
            ]);
        }

        if (remove_lip) {
            xy = wall - lip - tolerance / 4;
            z = height - lip_height;

            width = _width - lip_difference + tolerance / 2;
            length = _length - lip_difference + tolerance / 2;

            translate([xy, xy, z]) {
                cube([width, length, lip_height + e]);
            }

            if (chamfer_lip_removal) {
                depth = lip_offset_xy;

                translate([xy + depth, xy + depth, z - depth]) {
                    flat_top_rectangular_pyramid(
                       top_width = width,
                       top_length = length,

                       bottom_width = width - depth * 2,
                       bottom_length = length - depth * 2,

                       height = depth + e,

                       top_x = undef,
                       top_y = undef,

                       top_weight_x = .5,
                       top_weight_y = .5
                   );
                }
            }
        }
    }

    module _hinge() {
        hinge_count = hinge_count != undef
            ? hinge_count
            : get_hinge_clasp_count(_width);
        hinge_length = min(assumed_total_height, MINIMUM_HINGE_CLASP_LENGTH);
        hinge_width = HINGE_CLASP_MINIMUM_WIDTH;
        hinge_end_gutter = hinge_end_gutter == undef || hinge_count == 1
            ? ((_width / hinge_count) - hinge_width) / 2
            : hinge_end_gutter;

        availableWidth = (_width - hinge_end_gutter * 2 - hinge_width) /
            max(1, hinge_count - 1);

        for (i = [0 : hinge_count - 1]) {
            position = just_hinge_parts
                ? [i * (hinge_width + gutter), hinge_length, 0]
                : [
                    hinge_end_gutter + i * availableWidth,
                    _length - e,
                    height + hinge_length / 2
                ];

            rotation = just_hinge_parts ? [] : [-90, 0, 0];

            translate(position) rotate(rotation) {
                hinge_clasp(
                    hinge_width, hinge_length,
                    include_pins = false,
                    include_links = include_hinge_parts
                        || just_hinge_parts,
                    include_front_anchor = false,
                    include_back_anchor = !just_hinge_parts,
                    tooth_count = undef
                );
            }
        }
    }

    module _clasp(is_bottom = false) {
        clasp_count = clasp_count != undef
            ? clasp_count
            : get_hinge_clasp_count(_width);

        clasp_width = HINGE_CLASP_MINIMUM_WIDTH;
        clasp_length = min(assumed_total_height, MINIMUM_HINGE_CLASP_LENGTH);

        clasp_end_gutter = clasp_end_gutter == undef || clasp_count == 1
            ? ((_width / clasp_count) - clasp_width) / 2
            : clasp_end_gutter;

        availableWidth = (_width - clasp_end_gutter * 2 - clasp_width) /
            max(1, clasp_count - 1);

        for (i = [0 : clasp_count - 1]) {
            position = just_hinge_parts
                ? [i * (clasp_width + gutter), 0, 0]
                : [
                    clasp_end_gutter + i * availableWidth,
                    e,
                    height - clasp_length / 2
                ];

            translate(position) rotate(just_hinge_parts ? [] : [90, 0, 0]) {
                hinge_clasp(
                    clasp_width,
                    clasp_length,
                    clasp = true,
                    include_clasp_knob = is_bottom && !just_hinge_parts,
                    include_front_anchor = include_hinge_parts
                        || just_hinge_parts,
                    include_back_anchor = !just_hinge_parts && !is_bottom,
                    include_links = include_hinge_parts
                        || just_hinge_parts,
                    flipped = !is_bottom
                );
            }
        }
    }

    module _output() {
        if (just_hinge_parts) {
            _hinge();
            _clasp(true);
        } else {
            difference() {
                group() {
                    difference() {
                        _outer_wall();
                        _inner_cutout();
                    }

                    if (include_hinge) { _hinge(); }
                    if (include_clasp) { _clasp(add_lip); } // TODO: decouple
                }
            }
        }
    }

    translate([is_left_right_hinge ? _length : 0, 0, 0]) {
        rotate([0, 0, is_left_right_hinge ? 90 : 0]) {
            _output();
        }
    }
}

enclosure_half(
    width = 120,
    length = 90,
    height = 25,

    wall = 2.5,
    floor_ceiling = undef,

    add_lip = false,
    remove_lip = true,

    include_hinge = true,
    include_hinge_parts = true,

    hinge_count = 2,
    clasp_count = undef,

    include_clasp = true,

    just_hinge_parts = false,

    lip = 1,
    lip_height = LIP_BOX_DEFAULT_LIP_HEIGHT,

    radius = 2,

    chamfer_lip_removal = true,

    gutter = 5,
    clasp_end_gutter = undef,
    hinge_end_gutter = undef,

    tolerance = .1
);
